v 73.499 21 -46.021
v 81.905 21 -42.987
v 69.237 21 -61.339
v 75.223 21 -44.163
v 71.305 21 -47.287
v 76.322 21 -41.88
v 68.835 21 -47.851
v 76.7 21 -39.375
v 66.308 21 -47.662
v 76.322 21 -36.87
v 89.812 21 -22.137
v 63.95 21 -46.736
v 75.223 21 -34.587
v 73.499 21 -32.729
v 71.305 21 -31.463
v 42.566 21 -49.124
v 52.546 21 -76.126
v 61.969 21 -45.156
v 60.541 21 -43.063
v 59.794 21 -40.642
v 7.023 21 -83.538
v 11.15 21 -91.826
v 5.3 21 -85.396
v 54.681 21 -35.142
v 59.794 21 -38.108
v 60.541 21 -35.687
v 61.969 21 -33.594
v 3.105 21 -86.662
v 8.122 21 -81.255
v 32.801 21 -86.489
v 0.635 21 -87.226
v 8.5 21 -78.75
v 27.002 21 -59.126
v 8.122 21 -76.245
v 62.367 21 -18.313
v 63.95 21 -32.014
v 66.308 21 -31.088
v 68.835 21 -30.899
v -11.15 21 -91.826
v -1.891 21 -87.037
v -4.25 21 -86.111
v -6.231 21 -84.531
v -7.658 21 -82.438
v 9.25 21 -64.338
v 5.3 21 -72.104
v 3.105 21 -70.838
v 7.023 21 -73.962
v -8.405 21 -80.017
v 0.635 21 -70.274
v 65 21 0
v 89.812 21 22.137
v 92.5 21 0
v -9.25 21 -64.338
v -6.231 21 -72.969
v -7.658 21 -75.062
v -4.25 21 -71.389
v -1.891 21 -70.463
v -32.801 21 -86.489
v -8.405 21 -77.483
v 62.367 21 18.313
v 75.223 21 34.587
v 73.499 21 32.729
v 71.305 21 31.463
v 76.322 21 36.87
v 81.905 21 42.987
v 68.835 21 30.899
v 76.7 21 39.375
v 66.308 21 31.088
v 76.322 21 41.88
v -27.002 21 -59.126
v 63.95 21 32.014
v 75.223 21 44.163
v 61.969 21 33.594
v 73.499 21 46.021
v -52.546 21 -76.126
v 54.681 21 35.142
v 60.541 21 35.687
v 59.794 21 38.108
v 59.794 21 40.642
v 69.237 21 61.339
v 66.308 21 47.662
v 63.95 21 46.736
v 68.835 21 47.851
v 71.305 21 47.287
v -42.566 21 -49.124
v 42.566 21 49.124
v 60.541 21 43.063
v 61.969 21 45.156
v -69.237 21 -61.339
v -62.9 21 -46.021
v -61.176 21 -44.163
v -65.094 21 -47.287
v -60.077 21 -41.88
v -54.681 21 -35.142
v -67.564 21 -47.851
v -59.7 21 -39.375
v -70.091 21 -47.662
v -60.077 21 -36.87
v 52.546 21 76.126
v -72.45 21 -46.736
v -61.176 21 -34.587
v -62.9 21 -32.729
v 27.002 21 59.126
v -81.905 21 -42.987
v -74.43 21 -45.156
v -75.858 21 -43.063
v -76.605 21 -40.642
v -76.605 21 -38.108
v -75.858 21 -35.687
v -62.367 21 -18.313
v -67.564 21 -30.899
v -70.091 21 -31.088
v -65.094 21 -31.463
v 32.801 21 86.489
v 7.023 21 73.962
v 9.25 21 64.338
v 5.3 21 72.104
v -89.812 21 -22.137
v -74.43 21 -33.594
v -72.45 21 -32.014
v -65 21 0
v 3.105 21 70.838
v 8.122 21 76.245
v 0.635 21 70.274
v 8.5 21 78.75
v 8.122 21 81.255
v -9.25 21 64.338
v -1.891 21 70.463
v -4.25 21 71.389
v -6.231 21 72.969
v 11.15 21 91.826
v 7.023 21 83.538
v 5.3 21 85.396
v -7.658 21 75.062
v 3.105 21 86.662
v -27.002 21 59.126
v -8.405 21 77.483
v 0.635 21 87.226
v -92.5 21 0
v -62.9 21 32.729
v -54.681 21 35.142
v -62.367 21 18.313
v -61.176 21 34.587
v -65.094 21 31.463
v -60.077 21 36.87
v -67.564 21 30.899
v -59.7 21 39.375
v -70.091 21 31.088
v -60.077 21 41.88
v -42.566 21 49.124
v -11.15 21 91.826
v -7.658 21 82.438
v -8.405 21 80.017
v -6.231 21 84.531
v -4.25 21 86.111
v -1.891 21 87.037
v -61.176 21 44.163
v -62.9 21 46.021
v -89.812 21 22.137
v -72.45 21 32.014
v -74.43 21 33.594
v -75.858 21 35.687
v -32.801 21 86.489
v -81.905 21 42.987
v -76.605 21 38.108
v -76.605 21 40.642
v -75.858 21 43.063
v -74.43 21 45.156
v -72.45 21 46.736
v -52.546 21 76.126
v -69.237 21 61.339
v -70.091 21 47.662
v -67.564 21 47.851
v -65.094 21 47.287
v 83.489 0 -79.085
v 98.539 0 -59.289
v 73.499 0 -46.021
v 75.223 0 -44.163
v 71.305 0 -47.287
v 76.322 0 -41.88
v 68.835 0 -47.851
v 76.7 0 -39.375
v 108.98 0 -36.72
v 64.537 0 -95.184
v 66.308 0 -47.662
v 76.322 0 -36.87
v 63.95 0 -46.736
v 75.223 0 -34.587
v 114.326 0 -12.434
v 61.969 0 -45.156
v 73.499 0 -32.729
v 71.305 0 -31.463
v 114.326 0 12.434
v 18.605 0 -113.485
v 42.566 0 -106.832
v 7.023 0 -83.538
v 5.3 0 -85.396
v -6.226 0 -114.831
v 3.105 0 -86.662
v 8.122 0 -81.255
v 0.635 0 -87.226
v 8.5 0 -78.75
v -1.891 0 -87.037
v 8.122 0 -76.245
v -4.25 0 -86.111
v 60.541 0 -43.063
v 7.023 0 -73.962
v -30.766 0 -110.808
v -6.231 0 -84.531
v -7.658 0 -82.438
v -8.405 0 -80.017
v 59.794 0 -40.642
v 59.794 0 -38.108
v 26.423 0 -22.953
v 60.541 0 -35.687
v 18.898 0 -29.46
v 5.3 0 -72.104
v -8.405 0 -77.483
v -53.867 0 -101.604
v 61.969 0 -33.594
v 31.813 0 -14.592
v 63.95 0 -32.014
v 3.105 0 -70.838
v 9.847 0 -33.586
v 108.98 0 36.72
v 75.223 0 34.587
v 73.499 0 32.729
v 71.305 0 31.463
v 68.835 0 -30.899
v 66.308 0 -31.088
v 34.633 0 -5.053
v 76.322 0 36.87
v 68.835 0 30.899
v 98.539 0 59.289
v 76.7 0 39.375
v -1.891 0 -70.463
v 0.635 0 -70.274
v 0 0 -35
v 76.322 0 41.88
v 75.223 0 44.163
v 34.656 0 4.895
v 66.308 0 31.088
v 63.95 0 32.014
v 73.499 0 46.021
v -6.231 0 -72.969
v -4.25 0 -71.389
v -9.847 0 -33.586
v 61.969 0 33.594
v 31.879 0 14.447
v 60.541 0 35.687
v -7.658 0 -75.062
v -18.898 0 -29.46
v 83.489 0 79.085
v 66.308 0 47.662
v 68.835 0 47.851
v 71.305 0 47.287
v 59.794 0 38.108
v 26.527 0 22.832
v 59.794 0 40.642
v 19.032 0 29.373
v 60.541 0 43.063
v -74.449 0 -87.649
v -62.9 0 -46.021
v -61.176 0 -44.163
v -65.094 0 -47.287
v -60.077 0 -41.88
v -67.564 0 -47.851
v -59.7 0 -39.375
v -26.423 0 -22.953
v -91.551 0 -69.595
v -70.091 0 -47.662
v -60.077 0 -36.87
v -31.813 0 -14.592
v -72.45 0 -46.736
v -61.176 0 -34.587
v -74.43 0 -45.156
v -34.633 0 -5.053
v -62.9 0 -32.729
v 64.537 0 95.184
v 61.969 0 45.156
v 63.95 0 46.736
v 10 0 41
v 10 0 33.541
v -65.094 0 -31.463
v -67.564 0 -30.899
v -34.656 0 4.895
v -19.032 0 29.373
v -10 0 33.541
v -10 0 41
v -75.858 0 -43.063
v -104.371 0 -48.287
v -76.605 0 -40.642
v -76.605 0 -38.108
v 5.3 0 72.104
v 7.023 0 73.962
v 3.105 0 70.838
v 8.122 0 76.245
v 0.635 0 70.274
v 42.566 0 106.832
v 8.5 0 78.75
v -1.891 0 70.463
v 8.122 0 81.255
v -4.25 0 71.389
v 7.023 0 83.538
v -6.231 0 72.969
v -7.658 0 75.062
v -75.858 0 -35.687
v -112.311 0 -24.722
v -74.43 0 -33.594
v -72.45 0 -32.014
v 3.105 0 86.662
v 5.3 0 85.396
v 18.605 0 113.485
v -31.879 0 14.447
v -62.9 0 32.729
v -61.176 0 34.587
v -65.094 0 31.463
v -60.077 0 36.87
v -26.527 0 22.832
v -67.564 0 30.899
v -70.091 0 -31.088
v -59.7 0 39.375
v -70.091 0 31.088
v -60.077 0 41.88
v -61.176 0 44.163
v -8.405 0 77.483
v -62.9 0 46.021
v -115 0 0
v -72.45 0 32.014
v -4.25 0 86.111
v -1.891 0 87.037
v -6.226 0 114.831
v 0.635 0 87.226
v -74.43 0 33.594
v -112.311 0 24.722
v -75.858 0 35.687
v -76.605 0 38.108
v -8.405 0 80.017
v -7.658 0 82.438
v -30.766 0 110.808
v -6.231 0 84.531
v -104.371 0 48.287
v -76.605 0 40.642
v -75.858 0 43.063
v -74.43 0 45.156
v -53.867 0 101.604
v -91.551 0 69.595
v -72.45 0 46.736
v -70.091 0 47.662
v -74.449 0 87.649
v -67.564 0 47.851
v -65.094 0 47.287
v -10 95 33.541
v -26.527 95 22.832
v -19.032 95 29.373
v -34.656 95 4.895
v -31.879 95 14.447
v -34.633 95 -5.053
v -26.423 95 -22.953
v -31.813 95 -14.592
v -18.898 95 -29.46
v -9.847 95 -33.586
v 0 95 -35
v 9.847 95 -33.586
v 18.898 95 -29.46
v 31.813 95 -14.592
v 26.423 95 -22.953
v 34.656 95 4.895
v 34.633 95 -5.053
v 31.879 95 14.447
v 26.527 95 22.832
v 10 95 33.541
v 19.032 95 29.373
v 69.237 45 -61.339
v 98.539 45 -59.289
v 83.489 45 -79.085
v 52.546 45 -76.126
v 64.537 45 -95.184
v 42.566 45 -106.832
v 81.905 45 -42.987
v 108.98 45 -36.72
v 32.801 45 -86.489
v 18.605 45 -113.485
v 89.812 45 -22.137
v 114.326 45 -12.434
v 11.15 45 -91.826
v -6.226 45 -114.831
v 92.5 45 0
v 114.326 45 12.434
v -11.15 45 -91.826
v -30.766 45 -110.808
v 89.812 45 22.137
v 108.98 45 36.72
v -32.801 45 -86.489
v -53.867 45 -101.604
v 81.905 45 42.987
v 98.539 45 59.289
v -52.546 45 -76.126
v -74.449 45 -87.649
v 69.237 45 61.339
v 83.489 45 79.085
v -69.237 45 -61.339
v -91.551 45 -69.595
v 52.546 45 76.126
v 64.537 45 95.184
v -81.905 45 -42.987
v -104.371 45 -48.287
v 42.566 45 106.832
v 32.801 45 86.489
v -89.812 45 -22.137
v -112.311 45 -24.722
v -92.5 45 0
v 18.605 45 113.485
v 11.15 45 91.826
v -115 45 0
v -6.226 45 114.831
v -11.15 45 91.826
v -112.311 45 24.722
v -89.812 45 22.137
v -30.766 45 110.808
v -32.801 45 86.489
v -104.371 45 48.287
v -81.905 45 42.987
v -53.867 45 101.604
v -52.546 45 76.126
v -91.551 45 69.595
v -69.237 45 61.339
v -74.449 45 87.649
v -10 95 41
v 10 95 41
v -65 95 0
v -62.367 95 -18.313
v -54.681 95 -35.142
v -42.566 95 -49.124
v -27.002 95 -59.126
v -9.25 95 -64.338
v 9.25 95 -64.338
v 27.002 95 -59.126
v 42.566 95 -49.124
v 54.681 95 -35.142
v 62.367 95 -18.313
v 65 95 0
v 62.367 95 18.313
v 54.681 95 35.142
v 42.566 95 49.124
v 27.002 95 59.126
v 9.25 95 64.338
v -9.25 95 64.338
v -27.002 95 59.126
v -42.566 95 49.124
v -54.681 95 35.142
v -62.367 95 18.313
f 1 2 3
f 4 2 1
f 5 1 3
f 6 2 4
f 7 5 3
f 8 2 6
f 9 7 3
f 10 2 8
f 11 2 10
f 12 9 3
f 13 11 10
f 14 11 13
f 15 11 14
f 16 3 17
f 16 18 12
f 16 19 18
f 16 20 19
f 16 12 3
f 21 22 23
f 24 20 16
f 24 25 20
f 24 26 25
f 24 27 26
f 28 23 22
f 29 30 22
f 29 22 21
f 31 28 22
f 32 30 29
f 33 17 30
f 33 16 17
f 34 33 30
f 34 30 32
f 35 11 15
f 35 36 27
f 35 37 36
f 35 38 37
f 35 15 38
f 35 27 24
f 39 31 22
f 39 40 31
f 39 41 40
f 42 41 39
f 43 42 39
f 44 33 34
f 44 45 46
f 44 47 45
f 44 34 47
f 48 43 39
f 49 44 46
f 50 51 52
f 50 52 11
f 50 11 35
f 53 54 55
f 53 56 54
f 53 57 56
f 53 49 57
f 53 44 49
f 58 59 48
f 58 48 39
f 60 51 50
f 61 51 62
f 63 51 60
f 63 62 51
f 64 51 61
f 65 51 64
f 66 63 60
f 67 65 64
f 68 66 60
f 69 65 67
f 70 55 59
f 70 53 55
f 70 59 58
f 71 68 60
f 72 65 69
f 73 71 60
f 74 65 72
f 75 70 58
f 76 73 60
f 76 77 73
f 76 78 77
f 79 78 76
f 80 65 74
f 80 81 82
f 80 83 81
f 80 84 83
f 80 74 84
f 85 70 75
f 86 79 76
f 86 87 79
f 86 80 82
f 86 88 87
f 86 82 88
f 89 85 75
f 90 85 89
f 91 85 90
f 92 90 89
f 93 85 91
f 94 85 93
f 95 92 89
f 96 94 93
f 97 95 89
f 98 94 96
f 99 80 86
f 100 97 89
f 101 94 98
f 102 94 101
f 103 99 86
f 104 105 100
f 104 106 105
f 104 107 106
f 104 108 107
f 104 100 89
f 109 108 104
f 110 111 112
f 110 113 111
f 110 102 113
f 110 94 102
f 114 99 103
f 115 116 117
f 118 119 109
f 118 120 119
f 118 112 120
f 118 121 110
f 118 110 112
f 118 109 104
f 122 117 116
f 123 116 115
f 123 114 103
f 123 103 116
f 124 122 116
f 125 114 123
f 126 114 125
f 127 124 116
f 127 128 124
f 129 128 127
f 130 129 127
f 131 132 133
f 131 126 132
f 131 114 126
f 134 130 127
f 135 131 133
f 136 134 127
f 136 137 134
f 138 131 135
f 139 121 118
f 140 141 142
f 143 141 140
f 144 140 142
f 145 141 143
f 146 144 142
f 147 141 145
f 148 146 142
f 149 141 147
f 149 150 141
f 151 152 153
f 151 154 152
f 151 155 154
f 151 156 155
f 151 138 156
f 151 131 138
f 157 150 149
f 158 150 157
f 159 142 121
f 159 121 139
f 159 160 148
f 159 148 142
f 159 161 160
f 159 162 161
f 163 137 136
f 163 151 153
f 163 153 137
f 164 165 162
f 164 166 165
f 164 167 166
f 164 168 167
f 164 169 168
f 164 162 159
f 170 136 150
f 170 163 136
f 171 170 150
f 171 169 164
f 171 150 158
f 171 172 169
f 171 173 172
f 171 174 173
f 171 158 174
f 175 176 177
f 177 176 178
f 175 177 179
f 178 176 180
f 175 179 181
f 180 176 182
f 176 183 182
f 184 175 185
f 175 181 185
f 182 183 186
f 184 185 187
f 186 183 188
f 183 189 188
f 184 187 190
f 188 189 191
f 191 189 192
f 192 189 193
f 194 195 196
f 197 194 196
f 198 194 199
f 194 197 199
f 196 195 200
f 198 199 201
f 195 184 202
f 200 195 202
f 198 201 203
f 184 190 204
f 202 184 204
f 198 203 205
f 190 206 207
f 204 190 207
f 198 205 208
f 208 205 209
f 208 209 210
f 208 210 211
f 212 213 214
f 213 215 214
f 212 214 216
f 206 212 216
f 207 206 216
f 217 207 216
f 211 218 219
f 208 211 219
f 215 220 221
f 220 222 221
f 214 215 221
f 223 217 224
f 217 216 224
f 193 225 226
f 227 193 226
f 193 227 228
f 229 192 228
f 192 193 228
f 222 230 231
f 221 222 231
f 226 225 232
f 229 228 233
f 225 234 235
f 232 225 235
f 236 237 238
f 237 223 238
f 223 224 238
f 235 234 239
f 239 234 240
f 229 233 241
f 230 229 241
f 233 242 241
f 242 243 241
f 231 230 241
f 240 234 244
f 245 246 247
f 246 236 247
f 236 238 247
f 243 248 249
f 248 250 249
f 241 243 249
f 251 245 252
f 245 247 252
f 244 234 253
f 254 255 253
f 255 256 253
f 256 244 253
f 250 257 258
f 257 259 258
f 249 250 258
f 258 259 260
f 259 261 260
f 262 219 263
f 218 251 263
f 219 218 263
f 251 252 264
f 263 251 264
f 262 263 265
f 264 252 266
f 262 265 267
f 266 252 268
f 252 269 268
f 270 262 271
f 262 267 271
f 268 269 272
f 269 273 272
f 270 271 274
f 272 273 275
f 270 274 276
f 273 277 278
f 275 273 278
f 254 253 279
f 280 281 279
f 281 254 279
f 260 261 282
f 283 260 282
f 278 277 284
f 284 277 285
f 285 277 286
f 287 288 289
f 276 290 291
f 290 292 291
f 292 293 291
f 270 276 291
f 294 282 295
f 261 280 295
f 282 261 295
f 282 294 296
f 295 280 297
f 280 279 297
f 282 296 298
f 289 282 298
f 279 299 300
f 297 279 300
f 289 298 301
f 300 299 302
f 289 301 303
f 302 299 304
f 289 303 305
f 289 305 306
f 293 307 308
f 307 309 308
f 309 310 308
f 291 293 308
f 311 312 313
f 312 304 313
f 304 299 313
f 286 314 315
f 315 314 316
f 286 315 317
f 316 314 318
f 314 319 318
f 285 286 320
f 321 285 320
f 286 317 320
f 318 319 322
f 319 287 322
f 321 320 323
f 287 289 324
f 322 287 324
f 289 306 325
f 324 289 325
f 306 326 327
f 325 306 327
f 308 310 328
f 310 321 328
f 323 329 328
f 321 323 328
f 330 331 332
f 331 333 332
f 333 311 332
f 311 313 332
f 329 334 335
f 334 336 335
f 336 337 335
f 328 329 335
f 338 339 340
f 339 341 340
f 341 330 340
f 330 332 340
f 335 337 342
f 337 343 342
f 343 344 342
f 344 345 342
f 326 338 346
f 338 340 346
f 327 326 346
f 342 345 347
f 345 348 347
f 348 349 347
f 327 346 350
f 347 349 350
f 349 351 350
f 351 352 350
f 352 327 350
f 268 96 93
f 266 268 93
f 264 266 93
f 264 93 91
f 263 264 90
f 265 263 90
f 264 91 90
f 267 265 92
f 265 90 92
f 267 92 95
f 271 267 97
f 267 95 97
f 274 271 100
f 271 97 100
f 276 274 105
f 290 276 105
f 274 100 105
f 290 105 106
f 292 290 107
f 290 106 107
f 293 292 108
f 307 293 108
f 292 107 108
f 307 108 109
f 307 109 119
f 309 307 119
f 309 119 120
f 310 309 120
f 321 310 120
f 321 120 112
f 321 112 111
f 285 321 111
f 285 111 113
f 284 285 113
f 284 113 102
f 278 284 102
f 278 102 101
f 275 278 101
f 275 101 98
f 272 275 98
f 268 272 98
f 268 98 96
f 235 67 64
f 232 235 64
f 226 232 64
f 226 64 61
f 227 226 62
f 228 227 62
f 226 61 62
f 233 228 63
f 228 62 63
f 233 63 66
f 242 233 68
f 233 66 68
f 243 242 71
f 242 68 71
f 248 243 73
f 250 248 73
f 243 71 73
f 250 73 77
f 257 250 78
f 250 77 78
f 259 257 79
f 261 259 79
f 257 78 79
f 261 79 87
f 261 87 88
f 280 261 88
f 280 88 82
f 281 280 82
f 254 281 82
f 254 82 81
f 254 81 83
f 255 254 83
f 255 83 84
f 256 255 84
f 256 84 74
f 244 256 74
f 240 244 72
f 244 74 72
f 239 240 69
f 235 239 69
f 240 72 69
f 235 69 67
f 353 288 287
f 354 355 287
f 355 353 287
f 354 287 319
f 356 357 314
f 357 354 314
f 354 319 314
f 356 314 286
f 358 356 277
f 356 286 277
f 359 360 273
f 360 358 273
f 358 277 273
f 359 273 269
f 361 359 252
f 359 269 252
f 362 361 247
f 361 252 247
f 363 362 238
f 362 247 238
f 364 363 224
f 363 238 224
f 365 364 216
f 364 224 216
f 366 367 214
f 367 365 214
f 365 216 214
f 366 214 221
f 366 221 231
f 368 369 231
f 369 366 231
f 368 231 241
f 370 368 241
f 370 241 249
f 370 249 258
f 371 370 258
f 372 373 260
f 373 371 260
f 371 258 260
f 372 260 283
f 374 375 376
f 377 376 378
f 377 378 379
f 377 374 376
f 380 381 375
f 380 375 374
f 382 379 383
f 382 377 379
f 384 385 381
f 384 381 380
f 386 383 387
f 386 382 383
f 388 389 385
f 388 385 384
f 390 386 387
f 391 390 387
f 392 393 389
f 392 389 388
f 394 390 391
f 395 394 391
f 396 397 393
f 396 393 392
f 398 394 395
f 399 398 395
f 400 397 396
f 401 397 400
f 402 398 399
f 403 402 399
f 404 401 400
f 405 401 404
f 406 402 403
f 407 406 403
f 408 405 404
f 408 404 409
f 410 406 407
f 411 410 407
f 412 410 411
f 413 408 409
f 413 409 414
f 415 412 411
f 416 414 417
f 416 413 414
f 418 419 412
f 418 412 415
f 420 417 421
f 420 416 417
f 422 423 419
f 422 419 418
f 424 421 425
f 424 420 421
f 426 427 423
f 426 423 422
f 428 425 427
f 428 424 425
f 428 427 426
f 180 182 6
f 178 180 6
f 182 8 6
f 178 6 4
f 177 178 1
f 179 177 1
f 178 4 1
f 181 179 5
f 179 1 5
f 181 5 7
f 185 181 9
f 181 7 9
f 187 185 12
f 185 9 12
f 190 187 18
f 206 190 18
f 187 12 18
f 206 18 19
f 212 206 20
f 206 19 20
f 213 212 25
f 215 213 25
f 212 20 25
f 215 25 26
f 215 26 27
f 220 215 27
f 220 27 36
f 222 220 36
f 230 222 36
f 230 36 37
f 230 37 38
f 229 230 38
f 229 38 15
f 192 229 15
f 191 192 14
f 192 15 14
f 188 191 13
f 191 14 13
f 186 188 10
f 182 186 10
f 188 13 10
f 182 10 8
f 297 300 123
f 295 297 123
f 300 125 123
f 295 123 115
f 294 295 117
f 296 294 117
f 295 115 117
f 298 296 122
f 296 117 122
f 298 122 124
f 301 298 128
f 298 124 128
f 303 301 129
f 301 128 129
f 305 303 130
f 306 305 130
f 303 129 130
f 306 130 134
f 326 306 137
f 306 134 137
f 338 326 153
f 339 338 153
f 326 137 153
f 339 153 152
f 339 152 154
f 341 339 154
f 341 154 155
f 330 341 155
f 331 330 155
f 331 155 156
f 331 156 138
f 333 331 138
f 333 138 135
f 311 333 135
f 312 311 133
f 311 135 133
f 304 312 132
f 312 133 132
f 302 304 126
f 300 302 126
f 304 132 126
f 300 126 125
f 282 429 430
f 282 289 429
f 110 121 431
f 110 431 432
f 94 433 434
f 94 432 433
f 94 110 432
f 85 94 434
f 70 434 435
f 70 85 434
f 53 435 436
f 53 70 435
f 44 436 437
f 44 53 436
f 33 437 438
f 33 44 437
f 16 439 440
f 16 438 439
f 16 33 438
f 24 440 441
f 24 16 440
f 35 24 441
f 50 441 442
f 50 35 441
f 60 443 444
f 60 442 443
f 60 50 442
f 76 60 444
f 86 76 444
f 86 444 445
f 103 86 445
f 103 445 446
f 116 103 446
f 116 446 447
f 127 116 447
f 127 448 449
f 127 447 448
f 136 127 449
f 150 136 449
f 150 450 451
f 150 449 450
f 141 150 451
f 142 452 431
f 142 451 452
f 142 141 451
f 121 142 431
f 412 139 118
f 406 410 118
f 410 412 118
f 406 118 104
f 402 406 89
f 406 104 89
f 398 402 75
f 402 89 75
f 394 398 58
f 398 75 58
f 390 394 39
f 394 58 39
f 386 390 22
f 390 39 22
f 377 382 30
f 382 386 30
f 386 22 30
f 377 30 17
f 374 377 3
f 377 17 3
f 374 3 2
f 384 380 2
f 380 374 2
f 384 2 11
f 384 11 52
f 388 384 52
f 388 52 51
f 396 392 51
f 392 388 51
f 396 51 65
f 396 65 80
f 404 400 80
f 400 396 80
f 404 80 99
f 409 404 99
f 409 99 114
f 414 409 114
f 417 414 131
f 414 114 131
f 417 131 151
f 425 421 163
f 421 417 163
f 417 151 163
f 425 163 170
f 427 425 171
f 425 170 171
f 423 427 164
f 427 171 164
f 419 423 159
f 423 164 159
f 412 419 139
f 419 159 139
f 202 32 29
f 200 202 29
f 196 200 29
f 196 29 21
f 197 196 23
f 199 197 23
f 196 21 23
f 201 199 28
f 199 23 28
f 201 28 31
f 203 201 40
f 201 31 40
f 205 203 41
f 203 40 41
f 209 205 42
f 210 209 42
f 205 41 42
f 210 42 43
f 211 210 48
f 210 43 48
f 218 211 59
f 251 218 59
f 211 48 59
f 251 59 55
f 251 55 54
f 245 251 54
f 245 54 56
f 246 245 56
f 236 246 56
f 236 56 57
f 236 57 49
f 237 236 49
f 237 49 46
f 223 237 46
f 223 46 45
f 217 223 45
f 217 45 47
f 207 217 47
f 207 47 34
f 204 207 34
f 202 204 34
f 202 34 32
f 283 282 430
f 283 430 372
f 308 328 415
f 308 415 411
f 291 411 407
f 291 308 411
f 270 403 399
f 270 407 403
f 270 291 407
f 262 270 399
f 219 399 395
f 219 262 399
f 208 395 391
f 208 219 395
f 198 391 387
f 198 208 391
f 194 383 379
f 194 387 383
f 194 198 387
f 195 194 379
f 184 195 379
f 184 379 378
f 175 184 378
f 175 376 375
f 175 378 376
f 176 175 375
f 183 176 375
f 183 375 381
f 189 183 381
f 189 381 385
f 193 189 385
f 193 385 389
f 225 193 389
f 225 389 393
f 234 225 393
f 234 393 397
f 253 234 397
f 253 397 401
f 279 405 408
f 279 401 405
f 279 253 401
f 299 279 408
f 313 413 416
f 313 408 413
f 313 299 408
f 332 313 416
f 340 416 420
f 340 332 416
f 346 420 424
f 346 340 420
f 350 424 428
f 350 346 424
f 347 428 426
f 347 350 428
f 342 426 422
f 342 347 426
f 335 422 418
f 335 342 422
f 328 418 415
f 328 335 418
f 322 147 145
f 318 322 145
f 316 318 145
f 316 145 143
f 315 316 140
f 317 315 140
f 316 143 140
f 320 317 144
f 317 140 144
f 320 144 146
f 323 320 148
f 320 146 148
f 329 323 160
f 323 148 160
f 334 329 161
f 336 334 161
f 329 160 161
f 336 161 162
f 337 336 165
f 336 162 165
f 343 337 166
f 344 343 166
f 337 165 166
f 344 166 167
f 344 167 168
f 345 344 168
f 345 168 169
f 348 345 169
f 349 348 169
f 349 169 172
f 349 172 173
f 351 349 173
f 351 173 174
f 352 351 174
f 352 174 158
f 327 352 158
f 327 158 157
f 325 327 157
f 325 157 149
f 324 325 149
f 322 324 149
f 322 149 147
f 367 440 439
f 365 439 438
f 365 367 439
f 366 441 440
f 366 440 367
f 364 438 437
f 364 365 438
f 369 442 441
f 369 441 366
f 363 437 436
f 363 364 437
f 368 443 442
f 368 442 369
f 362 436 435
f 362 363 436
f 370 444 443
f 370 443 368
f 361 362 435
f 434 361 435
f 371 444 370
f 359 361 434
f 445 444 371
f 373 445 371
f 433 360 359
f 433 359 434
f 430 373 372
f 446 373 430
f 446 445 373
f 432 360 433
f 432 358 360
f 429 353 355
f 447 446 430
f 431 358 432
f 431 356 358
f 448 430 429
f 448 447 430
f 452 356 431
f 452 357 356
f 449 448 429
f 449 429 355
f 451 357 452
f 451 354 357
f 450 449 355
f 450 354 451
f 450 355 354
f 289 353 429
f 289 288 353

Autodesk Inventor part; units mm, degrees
ref_plane "YZ Plane" through (0, 0, 0) normal (1, 0, 0) x (0, 1, 0)
ref_plane "XZ Plane" through (0, 0, 0) normal (0, 1, 0) x (-1, 0, 0)
ref_plane "XY Plane" through (0, 0, 0) normal (0, 0, 1) x (1, 0, 0)
sketch "Náčrt1" plane through (0, 0, 0) normal (0, 1, 0) x (-1, 0, 0)
  circle A0 centre (0, 0) radius 115
  circle A1 centre (0, 0) radius 92.5
  circle A2 centre (0, 0) radius 35
  circle A3 centre (0, 0) radius 65
  dimension "d0" = 230
  dimension "d1" = 185
  dimension "d2" = 70
  dimension "d3" = 130
extrude "Vysunutí1" add sketch "Náčrt1" along normal blind 95 contours A3
extrude "Vysunutí2" add sketch "Náčrt1" along normal blind 21 contours A1
extrude "Vysunutí3" add sketch "Náčrt1" along normal blind 45 contours A0
sketch "Náčrt2" plane through (0, 21, 0) normal (0, 1, 0) x (1, 0, 0)
  circle A0 centre (0, 0) radius 65 construction
  line L0 (0, -65) -> (0, -92.5) construction
  circle A1 centre (0, 0) radius 92.5 construction
  circle A2 centre (0, -78.75) radius 8.5
  circle A3 centre (68.1995, -39.375) radius 8.5
  circle A4 centre (68.1995, 39.375) radius 8.5
  circle A5 centre (0, 78.75) radius 8.5
  circle A6 centre (-68.1995, 39.375) radius 8.5
  circle A7 centre (-68.1995, -39.375) radius 8.5
  dimension "d10" = 27.5
  dimension "d11" = 17
  dimension "d14" = 360
extrude "Vysunutí4" cut sketch "Náčrt2" against normal through all
sketch "Náčrt3" plane through (0, 0, 0) normal (0, -1, 0) x (1, 0, 0)
  line L0 (-10, 41) -> (10, 41)
  line L1 (10, 41) -> (10, 29)
  line L2 (10, 29) -> (-10, 29)
  line L3 (-10, 29) -> (-10, 41)
  circle A0 centre (0, 0) radius 35 projected
  line L4 (-10, 41) -> (10, 29) construction
  line L5 (10, 41) -> (-10, 29) construction
  point P0 (0, 35)
  point P1 (0, 29)
  dimension "d18" = 20
  dimension "d19" = 12
  dimension "d20" = 29
extrude "Vysunutí5" cut sketch "Náčrt3" against normal through all contours L0 L1 A0 L3 | A0 L1 L2 L3 picked at (1.1251, 30.9456)
properties part number "projektspojkas2v1" material "Sedá litina"
